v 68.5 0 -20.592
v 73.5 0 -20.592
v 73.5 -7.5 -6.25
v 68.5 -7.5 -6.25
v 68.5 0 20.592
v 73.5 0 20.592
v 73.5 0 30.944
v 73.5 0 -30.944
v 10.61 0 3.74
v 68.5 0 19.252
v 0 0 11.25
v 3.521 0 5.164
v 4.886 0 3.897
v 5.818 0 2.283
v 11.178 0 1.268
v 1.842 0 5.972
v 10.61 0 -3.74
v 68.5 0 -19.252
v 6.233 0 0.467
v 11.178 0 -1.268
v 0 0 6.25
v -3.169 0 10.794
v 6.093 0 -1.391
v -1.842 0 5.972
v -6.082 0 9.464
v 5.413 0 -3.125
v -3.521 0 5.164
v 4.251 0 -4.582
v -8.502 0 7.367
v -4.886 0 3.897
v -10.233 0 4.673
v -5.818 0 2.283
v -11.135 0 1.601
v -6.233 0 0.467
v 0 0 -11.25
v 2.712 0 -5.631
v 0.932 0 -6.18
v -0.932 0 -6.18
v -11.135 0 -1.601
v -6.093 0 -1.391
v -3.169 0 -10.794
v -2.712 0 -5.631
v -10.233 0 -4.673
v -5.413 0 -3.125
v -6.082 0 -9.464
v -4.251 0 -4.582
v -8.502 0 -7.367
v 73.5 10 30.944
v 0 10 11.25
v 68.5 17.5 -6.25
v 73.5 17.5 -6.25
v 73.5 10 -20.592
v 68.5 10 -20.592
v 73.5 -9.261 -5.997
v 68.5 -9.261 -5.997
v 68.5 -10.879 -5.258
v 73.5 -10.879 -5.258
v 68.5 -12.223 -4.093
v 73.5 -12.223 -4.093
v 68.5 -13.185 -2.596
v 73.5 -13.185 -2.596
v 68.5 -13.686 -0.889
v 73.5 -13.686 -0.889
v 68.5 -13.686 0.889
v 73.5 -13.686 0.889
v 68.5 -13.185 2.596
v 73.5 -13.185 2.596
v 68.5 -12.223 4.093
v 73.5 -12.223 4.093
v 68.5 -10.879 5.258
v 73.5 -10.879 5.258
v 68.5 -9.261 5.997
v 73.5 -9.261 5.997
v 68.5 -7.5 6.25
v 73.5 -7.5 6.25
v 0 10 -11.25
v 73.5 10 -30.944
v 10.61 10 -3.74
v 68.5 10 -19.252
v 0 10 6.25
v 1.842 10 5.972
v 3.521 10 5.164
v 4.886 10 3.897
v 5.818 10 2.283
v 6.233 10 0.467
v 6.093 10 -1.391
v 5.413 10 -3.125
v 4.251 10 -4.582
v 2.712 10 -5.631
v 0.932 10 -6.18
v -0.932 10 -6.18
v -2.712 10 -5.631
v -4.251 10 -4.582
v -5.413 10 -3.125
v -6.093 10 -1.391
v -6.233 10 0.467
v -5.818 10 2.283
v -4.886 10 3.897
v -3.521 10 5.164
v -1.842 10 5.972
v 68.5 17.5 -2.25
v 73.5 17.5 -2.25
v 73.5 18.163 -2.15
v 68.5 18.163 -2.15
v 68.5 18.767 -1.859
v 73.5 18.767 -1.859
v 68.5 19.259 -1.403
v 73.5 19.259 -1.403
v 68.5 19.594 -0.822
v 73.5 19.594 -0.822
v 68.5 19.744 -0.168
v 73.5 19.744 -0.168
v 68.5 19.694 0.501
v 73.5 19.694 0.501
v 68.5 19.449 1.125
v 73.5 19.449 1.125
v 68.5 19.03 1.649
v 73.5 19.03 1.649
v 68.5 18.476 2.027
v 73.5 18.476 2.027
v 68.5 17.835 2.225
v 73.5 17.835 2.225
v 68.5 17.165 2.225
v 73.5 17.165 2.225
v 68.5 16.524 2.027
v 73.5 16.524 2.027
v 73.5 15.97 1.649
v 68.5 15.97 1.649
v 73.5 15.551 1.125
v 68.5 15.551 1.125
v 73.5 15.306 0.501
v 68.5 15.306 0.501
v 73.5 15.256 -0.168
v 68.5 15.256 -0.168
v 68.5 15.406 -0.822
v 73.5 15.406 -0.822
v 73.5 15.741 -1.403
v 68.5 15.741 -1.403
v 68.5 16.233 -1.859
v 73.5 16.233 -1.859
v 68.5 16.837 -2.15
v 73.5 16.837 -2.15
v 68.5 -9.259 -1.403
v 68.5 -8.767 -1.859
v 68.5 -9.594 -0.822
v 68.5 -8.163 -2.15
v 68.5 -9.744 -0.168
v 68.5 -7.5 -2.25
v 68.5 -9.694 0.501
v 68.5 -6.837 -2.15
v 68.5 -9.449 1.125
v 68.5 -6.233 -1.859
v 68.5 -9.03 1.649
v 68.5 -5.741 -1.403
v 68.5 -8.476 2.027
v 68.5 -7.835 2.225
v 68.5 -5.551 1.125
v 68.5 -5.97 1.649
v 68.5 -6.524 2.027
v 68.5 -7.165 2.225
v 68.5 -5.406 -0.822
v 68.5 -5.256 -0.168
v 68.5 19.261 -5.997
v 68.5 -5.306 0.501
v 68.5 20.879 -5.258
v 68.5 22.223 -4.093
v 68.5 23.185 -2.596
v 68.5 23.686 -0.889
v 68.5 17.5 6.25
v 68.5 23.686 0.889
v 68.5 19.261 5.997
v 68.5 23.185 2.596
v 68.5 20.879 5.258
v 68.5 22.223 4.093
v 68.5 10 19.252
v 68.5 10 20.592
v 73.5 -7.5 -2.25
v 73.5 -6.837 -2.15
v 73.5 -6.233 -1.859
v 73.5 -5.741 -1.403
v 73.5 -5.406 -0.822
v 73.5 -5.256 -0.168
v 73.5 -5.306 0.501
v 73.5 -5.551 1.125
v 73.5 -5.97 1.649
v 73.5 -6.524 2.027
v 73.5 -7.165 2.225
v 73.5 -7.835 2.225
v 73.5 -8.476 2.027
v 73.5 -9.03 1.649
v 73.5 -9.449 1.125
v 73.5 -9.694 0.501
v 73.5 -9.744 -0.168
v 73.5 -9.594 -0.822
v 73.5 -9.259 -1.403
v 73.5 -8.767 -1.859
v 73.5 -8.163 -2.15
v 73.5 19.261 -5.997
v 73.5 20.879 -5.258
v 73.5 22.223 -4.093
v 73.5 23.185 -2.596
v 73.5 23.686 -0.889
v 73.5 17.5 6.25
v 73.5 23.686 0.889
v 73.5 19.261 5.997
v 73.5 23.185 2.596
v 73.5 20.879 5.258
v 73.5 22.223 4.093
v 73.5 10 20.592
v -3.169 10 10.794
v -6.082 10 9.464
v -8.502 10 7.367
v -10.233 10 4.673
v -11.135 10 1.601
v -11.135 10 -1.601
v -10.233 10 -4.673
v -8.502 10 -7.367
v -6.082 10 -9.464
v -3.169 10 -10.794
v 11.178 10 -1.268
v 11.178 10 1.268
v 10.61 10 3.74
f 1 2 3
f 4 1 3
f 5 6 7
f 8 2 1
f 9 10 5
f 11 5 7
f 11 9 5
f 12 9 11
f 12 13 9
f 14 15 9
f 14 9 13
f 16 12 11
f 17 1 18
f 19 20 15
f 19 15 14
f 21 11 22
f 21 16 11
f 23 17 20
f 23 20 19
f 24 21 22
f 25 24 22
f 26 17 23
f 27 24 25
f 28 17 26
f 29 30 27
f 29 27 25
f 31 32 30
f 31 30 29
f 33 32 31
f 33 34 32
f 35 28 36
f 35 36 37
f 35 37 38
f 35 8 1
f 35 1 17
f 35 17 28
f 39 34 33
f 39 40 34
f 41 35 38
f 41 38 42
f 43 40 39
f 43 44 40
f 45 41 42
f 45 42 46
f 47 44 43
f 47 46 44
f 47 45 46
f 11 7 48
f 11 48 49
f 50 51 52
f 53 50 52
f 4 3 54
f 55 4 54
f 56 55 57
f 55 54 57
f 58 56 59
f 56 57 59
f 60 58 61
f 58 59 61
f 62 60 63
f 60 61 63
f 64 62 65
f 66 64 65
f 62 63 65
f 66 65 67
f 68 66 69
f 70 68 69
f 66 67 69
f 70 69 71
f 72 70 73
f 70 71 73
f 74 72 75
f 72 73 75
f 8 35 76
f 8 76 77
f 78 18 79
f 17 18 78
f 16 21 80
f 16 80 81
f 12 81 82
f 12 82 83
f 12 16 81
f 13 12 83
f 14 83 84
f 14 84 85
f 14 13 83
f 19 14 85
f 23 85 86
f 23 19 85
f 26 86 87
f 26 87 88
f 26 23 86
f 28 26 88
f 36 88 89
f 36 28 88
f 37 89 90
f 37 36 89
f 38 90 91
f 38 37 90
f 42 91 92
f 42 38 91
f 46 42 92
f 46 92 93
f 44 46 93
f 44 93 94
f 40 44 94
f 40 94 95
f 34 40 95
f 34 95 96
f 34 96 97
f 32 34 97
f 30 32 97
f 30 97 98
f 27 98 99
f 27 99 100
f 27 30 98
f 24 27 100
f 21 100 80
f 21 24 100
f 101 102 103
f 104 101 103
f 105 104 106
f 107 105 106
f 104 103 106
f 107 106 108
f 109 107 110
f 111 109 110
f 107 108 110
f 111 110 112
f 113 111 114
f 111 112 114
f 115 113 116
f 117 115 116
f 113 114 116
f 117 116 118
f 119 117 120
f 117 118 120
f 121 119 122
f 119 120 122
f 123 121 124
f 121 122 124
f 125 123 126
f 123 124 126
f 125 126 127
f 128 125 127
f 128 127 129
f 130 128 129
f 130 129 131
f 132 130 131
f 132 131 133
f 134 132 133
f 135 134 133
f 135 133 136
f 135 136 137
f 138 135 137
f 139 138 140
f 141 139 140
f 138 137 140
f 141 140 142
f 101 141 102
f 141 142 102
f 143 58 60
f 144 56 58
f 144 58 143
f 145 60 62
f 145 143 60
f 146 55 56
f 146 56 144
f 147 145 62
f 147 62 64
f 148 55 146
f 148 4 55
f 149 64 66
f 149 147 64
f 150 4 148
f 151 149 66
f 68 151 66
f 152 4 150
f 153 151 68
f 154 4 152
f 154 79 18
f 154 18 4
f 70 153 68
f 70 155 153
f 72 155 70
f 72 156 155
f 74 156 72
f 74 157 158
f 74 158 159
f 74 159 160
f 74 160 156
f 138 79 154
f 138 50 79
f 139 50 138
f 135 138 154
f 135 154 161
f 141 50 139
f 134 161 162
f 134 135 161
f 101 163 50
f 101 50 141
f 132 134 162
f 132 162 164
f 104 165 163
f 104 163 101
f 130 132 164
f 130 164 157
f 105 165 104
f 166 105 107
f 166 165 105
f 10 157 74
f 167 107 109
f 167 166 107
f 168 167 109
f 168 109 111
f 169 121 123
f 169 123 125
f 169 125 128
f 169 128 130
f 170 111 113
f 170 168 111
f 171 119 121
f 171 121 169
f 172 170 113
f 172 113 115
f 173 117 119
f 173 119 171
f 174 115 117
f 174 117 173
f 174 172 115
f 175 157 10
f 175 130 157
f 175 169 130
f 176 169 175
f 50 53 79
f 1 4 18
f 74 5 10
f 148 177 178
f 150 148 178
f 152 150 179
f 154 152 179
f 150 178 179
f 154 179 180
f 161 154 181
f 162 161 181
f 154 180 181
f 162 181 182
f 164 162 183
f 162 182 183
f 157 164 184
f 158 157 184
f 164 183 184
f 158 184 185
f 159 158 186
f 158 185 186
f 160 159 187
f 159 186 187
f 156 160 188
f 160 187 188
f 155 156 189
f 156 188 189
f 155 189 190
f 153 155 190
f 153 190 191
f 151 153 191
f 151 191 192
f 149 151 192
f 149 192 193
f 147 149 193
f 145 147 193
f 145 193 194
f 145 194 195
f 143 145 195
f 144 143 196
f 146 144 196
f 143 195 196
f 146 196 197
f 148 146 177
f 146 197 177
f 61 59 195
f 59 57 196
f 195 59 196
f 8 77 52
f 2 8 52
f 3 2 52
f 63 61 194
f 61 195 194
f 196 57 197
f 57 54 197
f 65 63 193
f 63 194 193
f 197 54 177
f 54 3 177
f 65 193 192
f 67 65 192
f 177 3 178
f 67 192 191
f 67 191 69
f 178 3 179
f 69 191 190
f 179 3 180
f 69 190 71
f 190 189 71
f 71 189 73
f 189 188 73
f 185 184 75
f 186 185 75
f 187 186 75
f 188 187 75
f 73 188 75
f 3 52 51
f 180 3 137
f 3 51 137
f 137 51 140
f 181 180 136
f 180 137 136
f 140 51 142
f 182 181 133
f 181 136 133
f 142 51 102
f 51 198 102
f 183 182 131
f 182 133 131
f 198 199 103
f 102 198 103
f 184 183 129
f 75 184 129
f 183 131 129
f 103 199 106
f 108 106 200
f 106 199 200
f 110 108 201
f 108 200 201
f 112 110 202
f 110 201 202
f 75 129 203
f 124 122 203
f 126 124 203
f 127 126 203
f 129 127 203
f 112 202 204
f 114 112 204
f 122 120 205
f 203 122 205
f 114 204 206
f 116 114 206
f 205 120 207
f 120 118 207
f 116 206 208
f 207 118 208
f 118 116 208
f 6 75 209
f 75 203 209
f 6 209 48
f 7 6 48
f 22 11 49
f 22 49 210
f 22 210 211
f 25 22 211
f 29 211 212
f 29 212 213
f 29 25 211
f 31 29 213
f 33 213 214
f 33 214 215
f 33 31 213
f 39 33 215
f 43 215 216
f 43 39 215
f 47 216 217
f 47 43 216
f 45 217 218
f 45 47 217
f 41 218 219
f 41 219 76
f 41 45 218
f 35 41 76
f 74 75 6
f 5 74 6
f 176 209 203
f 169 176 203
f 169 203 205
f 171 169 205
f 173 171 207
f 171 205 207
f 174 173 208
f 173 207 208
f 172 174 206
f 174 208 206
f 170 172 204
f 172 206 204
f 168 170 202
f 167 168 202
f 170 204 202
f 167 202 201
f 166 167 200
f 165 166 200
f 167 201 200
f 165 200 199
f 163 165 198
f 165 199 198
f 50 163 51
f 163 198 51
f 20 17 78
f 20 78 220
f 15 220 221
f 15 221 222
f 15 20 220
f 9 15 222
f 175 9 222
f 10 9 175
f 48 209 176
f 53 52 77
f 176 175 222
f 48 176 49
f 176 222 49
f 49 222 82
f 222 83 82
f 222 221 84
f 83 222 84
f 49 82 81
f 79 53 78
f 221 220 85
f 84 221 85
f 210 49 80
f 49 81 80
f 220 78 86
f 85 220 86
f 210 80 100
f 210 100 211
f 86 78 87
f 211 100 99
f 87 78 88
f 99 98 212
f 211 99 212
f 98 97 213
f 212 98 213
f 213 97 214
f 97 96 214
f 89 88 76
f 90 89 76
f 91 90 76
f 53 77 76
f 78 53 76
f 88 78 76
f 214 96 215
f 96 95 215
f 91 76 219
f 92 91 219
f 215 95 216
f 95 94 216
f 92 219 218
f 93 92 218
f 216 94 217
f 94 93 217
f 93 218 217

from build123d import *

# Parameters (mm, degrees)
SKETCH1_R           = 6.25
BOSS_EXTRUDE1_DEPTH = 10
SKETCH2_R           = 2.25
BOSS_EXTRUDE2_DEPTH = 5


with BuildPart() as part:
    # Sketch1 → Boss-Extrude1 (new body)
    with BuildSketch(Plane(origin=(0, 0, 0), x_dir=(1, 0, 0), z_dir=(0, 1, 0))):
        with BuildLine():
            Line((0, 11.25), (73.5, 30.944265644))
            Line((73.5, 30.944265644), (73.5, 20.59150384))
            Line((73.5, 20.59150384), (10.610062869, 3.740195973))
            ThreePointArc((10.610062869, 3.740195973), (11.25, 0), (10.610062869, -3.740195973))
            Line((10.610062869, -3.740195973), (73.5, -20.59150384))
            Line((73.5, -20.59150384), (73.5, -30.944265644))
            Line((73.5, -30.944265644), (0, -11.25))
            ThreePointArc((0, -11.25), (-11.25, 0), (0, 11.25))
        make_face()
        with Locations(Location((0, 0, 0), (0, 0, 270))):
            Circle(SKETCH1_R, mode=Mode.SUBTRACT)
    extrude(amount=BOSS_EXTRUDE1_DEPTH)

    # Sketch2 → Boss-Extrude2 (add)
    with BuildSketch(Plane(origin=(73.5, 0, 0), x_dir=(0, 0, -1), z_dir=(1, 0, 0))):
        with BuildLine():
            Line((-20.59150384, 10), (-6.25, 17.5))
            ThreePointArc((-6.25, 17.5), (0, 23.75), (6.25, 17.5))
            Line((6.25, 17.5), (20.59150384, 10))
            Line((20.59150384, 10), (20.59150384, 0))
            Line((20.59150384, 0), (6.25, -7.5))
            ThreePointArc((6.25, -7.5), (0, -13.75), (-6.25, -7.5))
            Line((-6.25, -7.5), (-20.59150384, 0))
            Line((-20.59150384, 0), (-20.59150384, 10))
        make_face()
        with Locations((0, 17.5)):
            Circle(SKETCH2_R, mode=Mode.SUBTRACT)
        with Locations((0, -7.5)):
            Circle(SKETCH2_R, mode=Mode.SUBTRACT)
    extrude(amount=-BOSS_EXTRUDE2_DEPTH)


solid = part.part
